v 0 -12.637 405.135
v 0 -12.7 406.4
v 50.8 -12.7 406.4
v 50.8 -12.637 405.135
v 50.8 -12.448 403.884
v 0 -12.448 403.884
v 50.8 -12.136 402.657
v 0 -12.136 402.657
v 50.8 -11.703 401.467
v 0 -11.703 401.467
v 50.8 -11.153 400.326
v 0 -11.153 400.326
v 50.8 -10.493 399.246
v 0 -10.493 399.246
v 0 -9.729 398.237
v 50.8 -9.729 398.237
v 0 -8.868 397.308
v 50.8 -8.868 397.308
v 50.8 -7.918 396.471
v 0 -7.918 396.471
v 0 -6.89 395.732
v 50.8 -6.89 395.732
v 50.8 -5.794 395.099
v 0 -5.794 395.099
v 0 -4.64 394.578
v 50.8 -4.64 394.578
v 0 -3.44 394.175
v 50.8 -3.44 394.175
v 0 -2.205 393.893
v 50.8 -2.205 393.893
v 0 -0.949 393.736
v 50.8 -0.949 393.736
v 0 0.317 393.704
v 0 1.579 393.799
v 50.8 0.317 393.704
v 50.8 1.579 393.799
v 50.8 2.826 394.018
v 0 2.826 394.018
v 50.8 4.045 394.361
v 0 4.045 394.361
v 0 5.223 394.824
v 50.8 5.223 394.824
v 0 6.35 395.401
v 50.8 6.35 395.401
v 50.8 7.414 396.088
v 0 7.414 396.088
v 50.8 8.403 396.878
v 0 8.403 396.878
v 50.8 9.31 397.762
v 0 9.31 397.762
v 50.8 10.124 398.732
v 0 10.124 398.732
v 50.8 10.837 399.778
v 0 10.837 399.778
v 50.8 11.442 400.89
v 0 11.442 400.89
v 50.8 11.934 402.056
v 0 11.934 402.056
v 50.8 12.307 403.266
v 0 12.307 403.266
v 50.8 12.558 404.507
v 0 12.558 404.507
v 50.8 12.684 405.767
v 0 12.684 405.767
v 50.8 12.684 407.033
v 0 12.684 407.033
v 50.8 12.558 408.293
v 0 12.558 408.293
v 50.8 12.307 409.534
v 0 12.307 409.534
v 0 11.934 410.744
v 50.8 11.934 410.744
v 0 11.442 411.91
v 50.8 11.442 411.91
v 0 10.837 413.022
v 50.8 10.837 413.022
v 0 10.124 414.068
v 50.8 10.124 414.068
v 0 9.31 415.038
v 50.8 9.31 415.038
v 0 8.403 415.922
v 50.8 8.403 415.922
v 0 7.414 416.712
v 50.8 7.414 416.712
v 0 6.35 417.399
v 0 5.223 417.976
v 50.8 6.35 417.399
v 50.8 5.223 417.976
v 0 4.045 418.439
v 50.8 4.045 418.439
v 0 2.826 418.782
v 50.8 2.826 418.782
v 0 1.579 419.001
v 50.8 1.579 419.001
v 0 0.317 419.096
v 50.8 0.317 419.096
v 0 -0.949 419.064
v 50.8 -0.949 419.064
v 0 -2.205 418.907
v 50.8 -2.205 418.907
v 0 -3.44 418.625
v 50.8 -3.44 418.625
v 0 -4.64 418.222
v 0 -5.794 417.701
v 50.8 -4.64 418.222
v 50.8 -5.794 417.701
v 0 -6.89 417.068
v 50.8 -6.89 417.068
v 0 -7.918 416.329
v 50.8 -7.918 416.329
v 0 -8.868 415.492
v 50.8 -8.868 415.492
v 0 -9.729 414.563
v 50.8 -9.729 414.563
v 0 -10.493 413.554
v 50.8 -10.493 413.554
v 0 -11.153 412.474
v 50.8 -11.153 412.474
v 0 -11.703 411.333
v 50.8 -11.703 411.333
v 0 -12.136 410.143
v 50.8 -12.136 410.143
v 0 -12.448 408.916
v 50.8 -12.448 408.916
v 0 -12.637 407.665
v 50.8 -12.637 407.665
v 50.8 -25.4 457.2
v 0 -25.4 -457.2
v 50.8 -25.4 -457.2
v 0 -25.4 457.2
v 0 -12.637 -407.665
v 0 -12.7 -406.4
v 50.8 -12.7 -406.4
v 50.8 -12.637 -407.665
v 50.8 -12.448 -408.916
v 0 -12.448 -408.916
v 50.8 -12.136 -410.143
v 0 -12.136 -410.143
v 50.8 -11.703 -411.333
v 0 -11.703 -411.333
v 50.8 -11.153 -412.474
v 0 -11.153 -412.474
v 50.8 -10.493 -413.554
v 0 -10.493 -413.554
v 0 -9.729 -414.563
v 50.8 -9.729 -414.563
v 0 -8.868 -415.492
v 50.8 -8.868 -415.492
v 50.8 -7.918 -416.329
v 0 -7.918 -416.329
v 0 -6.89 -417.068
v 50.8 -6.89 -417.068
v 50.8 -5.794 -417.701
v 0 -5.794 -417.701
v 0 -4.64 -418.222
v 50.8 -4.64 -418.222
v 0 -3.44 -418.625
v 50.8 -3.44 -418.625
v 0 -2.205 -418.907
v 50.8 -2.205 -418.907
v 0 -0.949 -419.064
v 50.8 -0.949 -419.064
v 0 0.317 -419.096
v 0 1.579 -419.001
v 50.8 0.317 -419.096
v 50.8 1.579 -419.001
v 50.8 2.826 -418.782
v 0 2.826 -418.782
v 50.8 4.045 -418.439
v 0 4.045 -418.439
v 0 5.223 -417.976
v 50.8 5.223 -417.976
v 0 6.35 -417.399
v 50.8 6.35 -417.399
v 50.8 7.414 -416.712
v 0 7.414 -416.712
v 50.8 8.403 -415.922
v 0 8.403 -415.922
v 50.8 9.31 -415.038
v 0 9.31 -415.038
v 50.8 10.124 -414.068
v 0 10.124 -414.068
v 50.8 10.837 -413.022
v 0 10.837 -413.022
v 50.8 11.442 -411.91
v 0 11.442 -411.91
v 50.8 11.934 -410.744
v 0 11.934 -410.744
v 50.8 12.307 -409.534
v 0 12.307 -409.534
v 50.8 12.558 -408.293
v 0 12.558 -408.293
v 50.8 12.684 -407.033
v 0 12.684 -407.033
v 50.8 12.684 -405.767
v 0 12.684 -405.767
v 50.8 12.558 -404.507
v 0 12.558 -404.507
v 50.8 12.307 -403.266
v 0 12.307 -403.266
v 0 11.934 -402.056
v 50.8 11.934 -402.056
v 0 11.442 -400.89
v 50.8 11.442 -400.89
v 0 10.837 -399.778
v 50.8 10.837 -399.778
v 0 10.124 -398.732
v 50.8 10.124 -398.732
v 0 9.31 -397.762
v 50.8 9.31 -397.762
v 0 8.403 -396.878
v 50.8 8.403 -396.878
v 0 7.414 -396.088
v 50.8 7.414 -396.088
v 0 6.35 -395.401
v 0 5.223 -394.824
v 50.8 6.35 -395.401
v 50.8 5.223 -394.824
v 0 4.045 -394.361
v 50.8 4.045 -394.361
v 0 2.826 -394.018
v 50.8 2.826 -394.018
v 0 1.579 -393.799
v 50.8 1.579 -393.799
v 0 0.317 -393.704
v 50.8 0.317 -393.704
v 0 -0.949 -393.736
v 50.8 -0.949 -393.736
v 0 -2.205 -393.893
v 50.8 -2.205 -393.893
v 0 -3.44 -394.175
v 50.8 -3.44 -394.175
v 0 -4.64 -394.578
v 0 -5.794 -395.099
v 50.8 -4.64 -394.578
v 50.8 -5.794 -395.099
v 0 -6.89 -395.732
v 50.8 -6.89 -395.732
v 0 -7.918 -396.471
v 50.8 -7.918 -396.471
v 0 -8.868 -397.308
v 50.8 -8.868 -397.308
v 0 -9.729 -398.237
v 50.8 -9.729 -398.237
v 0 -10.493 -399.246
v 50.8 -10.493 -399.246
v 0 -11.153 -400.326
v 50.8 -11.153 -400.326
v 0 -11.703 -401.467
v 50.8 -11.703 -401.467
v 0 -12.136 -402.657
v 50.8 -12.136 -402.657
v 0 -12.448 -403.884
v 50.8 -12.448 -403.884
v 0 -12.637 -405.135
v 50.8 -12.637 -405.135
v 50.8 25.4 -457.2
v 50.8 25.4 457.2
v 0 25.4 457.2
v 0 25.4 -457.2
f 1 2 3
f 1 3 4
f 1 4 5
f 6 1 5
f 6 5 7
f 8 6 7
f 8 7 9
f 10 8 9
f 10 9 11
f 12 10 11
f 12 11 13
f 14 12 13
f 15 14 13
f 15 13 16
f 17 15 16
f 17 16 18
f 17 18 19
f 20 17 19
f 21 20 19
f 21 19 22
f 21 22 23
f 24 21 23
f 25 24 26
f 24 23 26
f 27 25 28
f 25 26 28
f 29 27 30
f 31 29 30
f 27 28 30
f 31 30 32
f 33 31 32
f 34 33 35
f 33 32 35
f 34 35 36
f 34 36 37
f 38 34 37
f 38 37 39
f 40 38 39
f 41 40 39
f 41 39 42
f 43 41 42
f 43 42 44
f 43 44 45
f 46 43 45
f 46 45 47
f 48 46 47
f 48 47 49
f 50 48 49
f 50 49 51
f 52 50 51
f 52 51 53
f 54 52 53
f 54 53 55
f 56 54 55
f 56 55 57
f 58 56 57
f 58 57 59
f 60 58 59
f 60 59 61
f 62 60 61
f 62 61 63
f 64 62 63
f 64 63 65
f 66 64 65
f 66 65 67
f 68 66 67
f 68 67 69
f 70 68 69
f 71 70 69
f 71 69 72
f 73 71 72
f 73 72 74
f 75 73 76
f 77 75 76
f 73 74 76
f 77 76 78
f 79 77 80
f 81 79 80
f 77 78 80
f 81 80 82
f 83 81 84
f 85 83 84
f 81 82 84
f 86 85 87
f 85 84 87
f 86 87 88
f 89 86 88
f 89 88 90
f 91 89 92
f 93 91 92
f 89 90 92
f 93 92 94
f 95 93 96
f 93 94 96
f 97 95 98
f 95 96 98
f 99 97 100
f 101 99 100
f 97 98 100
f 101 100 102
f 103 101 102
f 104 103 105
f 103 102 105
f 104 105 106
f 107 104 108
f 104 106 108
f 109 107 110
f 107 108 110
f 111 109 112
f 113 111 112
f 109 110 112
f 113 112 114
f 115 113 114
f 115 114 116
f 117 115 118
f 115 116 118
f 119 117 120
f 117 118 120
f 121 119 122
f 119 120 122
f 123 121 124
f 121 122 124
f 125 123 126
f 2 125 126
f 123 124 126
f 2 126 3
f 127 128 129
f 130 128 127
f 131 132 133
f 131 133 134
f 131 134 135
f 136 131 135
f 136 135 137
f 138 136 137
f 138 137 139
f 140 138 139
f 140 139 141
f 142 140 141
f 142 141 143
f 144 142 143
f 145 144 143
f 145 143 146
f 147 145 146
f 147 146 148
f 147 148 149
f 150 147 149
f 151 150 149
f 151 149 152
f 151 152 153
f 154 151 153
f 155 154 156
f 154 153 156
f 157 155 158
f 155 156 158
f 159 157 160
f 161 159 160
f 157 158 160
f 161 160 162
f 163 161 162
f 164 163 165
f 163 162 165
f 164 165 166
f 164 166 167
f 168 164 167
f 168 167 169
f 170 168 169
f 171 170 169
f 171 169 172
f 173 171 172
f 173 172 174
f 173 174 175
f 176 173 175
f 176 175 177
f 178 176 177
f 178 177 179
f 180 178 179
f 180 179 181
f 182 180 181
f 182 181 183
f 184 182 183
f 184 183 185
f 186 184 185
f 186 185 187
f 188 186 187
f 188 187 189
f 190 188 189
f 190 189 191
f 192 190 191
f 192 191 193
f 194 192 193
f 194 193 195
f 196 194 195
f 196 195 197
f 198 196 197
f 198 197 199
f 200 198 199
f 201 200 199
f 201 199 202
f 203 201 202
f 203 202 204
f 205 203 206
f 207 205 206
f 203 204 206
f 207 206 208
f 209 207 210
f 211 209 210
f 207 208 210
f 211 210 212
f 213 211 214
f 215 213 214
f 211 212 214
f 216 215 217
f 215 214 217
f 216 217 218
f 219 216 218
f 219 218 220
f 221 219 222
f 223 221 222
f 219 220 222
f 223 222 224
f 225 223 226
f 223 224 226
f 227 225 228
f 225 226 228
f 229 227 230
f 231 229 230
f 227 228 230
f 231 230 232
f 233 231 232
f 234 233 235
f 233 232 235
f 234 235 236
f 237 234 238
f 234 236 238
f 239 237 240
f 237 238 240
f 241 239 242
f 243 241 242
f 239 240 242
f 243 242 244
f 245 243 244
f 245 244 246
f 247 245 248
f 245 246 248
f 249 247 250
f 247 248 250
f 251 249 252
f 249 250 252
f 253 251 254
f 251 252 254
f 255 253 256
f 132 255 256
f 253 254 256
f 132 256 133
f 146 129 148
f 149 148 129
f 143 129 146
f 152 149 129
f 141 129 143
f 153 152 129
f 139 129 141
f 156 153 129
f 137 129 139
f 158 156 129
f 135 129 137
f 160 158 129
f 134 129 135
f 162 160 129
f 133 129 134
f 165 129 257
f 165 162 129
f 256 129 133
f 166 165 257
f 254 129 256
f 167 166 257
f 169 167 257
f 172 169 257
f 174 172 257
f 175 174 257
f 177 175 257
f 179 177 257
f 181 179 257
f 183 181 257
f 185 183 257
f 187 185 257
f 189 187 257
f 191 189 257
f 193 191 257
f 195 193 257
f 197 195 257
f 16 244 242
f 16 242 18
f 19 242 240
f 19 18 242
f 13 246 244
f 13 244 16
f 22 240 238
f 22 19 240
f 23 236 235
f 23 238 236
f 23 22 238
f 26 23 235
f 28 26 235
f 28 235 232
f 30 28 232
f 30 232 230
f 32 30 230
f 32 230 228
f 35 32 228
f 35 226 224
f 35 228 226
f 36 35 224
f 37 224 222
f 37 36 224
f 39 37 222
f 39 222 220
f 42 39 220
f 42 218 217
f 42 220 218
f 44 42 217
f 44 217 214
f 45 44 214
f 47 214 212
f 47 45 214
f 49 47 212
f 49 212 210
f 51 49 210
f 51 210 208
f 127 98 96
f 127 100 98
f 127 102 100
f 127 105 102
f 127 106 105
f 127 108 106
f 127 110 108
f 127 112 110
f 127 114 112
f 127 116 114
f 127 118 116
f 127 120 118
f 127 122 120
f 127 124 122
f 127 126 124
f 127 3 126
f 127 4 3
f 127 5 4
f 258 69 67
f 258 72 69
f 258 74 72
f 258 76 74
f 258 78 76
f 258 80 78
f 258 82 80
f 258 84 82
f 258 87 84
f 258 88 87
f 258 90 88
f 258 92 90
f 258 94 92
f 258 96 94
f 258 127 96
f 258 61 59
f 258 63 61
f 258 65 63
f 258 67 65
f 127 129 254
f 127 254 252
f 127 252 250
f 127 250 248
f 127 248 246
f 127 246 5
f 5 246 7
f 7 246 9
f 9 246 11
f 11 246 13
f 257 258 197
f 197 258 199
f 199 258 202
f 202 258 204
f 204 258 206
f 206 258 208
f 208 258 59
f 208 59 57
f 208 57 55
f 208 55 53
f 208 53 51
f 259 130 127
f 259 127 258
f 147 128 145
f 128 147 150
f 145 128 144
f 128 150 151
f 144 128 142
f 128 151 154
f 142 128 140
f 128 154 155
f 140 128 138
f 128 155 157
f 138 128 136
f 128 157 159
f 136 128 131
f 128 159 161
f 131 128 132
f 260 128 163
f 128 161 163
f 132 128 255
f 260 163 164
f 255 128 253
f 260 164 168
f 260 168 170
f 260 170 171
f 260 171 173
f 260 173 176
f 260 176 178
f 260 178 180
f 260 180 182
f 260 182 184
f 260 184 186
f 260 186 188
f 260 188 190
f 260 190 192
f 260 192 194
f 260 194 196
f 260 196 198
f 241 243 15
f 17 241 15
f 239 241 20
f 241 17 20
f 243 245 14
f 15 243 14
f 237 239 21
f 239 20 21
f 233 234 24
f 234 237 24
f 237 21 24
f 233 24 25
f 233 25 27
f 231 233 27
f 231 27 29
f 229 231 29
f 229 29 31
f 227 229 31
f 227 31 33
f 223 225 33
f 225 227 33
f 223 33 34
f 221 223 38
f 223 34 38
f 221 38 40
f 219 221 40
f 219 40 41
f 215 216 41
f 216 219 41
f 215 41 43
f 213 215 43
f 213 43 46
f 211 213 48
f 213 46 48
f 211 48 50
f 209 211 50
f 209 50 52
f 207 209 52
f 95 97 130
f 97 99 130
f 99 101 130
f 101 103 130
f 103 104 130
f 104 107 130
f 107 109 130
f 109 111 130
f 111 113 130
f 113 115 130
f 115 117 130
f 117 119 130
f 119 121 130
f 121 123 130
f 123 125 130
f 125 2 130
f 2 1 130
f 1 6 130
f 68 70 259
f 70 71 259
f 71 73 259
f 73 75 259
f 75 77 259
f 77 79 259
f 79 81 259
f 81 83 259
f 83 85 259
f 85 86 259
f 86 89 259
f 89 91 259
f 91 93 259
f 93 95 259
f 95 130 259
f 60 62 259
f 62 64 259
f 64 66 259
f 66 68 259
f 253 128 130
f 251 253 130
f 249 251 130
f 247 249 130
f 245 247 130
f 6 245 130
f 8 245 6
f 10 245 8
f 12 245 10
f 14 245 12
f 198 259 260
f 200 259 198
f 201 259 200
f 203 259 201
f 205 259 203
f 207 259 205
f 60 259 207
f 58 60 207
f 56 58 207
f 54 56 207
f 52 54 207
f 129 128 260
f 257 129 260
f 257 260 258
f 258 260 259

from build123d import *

# Parameters (mm, degrees)
F0_W     = 50.8
F0_H     = 914.4
F1_DEPTH = 50.8
F2_D     = 25.4


with BuildPart() as f1:
    # F0 (on Right) → F1 (new body)
    with BuildSketch(Plane.YZ):
        Rectangle(F0_W, F0_H)
    extrude(amount=F1_DEPTH)

    # F2 (through all)
    with Locations(Plane(origin=(0, 0, 0), x_dir=(0, 1, 0), z_dir=(-1, 0, 0))):
        with Locations((0, 406.4), (0, -406.4)):
            Hole(F2_D / 2)


solid = f1.part
